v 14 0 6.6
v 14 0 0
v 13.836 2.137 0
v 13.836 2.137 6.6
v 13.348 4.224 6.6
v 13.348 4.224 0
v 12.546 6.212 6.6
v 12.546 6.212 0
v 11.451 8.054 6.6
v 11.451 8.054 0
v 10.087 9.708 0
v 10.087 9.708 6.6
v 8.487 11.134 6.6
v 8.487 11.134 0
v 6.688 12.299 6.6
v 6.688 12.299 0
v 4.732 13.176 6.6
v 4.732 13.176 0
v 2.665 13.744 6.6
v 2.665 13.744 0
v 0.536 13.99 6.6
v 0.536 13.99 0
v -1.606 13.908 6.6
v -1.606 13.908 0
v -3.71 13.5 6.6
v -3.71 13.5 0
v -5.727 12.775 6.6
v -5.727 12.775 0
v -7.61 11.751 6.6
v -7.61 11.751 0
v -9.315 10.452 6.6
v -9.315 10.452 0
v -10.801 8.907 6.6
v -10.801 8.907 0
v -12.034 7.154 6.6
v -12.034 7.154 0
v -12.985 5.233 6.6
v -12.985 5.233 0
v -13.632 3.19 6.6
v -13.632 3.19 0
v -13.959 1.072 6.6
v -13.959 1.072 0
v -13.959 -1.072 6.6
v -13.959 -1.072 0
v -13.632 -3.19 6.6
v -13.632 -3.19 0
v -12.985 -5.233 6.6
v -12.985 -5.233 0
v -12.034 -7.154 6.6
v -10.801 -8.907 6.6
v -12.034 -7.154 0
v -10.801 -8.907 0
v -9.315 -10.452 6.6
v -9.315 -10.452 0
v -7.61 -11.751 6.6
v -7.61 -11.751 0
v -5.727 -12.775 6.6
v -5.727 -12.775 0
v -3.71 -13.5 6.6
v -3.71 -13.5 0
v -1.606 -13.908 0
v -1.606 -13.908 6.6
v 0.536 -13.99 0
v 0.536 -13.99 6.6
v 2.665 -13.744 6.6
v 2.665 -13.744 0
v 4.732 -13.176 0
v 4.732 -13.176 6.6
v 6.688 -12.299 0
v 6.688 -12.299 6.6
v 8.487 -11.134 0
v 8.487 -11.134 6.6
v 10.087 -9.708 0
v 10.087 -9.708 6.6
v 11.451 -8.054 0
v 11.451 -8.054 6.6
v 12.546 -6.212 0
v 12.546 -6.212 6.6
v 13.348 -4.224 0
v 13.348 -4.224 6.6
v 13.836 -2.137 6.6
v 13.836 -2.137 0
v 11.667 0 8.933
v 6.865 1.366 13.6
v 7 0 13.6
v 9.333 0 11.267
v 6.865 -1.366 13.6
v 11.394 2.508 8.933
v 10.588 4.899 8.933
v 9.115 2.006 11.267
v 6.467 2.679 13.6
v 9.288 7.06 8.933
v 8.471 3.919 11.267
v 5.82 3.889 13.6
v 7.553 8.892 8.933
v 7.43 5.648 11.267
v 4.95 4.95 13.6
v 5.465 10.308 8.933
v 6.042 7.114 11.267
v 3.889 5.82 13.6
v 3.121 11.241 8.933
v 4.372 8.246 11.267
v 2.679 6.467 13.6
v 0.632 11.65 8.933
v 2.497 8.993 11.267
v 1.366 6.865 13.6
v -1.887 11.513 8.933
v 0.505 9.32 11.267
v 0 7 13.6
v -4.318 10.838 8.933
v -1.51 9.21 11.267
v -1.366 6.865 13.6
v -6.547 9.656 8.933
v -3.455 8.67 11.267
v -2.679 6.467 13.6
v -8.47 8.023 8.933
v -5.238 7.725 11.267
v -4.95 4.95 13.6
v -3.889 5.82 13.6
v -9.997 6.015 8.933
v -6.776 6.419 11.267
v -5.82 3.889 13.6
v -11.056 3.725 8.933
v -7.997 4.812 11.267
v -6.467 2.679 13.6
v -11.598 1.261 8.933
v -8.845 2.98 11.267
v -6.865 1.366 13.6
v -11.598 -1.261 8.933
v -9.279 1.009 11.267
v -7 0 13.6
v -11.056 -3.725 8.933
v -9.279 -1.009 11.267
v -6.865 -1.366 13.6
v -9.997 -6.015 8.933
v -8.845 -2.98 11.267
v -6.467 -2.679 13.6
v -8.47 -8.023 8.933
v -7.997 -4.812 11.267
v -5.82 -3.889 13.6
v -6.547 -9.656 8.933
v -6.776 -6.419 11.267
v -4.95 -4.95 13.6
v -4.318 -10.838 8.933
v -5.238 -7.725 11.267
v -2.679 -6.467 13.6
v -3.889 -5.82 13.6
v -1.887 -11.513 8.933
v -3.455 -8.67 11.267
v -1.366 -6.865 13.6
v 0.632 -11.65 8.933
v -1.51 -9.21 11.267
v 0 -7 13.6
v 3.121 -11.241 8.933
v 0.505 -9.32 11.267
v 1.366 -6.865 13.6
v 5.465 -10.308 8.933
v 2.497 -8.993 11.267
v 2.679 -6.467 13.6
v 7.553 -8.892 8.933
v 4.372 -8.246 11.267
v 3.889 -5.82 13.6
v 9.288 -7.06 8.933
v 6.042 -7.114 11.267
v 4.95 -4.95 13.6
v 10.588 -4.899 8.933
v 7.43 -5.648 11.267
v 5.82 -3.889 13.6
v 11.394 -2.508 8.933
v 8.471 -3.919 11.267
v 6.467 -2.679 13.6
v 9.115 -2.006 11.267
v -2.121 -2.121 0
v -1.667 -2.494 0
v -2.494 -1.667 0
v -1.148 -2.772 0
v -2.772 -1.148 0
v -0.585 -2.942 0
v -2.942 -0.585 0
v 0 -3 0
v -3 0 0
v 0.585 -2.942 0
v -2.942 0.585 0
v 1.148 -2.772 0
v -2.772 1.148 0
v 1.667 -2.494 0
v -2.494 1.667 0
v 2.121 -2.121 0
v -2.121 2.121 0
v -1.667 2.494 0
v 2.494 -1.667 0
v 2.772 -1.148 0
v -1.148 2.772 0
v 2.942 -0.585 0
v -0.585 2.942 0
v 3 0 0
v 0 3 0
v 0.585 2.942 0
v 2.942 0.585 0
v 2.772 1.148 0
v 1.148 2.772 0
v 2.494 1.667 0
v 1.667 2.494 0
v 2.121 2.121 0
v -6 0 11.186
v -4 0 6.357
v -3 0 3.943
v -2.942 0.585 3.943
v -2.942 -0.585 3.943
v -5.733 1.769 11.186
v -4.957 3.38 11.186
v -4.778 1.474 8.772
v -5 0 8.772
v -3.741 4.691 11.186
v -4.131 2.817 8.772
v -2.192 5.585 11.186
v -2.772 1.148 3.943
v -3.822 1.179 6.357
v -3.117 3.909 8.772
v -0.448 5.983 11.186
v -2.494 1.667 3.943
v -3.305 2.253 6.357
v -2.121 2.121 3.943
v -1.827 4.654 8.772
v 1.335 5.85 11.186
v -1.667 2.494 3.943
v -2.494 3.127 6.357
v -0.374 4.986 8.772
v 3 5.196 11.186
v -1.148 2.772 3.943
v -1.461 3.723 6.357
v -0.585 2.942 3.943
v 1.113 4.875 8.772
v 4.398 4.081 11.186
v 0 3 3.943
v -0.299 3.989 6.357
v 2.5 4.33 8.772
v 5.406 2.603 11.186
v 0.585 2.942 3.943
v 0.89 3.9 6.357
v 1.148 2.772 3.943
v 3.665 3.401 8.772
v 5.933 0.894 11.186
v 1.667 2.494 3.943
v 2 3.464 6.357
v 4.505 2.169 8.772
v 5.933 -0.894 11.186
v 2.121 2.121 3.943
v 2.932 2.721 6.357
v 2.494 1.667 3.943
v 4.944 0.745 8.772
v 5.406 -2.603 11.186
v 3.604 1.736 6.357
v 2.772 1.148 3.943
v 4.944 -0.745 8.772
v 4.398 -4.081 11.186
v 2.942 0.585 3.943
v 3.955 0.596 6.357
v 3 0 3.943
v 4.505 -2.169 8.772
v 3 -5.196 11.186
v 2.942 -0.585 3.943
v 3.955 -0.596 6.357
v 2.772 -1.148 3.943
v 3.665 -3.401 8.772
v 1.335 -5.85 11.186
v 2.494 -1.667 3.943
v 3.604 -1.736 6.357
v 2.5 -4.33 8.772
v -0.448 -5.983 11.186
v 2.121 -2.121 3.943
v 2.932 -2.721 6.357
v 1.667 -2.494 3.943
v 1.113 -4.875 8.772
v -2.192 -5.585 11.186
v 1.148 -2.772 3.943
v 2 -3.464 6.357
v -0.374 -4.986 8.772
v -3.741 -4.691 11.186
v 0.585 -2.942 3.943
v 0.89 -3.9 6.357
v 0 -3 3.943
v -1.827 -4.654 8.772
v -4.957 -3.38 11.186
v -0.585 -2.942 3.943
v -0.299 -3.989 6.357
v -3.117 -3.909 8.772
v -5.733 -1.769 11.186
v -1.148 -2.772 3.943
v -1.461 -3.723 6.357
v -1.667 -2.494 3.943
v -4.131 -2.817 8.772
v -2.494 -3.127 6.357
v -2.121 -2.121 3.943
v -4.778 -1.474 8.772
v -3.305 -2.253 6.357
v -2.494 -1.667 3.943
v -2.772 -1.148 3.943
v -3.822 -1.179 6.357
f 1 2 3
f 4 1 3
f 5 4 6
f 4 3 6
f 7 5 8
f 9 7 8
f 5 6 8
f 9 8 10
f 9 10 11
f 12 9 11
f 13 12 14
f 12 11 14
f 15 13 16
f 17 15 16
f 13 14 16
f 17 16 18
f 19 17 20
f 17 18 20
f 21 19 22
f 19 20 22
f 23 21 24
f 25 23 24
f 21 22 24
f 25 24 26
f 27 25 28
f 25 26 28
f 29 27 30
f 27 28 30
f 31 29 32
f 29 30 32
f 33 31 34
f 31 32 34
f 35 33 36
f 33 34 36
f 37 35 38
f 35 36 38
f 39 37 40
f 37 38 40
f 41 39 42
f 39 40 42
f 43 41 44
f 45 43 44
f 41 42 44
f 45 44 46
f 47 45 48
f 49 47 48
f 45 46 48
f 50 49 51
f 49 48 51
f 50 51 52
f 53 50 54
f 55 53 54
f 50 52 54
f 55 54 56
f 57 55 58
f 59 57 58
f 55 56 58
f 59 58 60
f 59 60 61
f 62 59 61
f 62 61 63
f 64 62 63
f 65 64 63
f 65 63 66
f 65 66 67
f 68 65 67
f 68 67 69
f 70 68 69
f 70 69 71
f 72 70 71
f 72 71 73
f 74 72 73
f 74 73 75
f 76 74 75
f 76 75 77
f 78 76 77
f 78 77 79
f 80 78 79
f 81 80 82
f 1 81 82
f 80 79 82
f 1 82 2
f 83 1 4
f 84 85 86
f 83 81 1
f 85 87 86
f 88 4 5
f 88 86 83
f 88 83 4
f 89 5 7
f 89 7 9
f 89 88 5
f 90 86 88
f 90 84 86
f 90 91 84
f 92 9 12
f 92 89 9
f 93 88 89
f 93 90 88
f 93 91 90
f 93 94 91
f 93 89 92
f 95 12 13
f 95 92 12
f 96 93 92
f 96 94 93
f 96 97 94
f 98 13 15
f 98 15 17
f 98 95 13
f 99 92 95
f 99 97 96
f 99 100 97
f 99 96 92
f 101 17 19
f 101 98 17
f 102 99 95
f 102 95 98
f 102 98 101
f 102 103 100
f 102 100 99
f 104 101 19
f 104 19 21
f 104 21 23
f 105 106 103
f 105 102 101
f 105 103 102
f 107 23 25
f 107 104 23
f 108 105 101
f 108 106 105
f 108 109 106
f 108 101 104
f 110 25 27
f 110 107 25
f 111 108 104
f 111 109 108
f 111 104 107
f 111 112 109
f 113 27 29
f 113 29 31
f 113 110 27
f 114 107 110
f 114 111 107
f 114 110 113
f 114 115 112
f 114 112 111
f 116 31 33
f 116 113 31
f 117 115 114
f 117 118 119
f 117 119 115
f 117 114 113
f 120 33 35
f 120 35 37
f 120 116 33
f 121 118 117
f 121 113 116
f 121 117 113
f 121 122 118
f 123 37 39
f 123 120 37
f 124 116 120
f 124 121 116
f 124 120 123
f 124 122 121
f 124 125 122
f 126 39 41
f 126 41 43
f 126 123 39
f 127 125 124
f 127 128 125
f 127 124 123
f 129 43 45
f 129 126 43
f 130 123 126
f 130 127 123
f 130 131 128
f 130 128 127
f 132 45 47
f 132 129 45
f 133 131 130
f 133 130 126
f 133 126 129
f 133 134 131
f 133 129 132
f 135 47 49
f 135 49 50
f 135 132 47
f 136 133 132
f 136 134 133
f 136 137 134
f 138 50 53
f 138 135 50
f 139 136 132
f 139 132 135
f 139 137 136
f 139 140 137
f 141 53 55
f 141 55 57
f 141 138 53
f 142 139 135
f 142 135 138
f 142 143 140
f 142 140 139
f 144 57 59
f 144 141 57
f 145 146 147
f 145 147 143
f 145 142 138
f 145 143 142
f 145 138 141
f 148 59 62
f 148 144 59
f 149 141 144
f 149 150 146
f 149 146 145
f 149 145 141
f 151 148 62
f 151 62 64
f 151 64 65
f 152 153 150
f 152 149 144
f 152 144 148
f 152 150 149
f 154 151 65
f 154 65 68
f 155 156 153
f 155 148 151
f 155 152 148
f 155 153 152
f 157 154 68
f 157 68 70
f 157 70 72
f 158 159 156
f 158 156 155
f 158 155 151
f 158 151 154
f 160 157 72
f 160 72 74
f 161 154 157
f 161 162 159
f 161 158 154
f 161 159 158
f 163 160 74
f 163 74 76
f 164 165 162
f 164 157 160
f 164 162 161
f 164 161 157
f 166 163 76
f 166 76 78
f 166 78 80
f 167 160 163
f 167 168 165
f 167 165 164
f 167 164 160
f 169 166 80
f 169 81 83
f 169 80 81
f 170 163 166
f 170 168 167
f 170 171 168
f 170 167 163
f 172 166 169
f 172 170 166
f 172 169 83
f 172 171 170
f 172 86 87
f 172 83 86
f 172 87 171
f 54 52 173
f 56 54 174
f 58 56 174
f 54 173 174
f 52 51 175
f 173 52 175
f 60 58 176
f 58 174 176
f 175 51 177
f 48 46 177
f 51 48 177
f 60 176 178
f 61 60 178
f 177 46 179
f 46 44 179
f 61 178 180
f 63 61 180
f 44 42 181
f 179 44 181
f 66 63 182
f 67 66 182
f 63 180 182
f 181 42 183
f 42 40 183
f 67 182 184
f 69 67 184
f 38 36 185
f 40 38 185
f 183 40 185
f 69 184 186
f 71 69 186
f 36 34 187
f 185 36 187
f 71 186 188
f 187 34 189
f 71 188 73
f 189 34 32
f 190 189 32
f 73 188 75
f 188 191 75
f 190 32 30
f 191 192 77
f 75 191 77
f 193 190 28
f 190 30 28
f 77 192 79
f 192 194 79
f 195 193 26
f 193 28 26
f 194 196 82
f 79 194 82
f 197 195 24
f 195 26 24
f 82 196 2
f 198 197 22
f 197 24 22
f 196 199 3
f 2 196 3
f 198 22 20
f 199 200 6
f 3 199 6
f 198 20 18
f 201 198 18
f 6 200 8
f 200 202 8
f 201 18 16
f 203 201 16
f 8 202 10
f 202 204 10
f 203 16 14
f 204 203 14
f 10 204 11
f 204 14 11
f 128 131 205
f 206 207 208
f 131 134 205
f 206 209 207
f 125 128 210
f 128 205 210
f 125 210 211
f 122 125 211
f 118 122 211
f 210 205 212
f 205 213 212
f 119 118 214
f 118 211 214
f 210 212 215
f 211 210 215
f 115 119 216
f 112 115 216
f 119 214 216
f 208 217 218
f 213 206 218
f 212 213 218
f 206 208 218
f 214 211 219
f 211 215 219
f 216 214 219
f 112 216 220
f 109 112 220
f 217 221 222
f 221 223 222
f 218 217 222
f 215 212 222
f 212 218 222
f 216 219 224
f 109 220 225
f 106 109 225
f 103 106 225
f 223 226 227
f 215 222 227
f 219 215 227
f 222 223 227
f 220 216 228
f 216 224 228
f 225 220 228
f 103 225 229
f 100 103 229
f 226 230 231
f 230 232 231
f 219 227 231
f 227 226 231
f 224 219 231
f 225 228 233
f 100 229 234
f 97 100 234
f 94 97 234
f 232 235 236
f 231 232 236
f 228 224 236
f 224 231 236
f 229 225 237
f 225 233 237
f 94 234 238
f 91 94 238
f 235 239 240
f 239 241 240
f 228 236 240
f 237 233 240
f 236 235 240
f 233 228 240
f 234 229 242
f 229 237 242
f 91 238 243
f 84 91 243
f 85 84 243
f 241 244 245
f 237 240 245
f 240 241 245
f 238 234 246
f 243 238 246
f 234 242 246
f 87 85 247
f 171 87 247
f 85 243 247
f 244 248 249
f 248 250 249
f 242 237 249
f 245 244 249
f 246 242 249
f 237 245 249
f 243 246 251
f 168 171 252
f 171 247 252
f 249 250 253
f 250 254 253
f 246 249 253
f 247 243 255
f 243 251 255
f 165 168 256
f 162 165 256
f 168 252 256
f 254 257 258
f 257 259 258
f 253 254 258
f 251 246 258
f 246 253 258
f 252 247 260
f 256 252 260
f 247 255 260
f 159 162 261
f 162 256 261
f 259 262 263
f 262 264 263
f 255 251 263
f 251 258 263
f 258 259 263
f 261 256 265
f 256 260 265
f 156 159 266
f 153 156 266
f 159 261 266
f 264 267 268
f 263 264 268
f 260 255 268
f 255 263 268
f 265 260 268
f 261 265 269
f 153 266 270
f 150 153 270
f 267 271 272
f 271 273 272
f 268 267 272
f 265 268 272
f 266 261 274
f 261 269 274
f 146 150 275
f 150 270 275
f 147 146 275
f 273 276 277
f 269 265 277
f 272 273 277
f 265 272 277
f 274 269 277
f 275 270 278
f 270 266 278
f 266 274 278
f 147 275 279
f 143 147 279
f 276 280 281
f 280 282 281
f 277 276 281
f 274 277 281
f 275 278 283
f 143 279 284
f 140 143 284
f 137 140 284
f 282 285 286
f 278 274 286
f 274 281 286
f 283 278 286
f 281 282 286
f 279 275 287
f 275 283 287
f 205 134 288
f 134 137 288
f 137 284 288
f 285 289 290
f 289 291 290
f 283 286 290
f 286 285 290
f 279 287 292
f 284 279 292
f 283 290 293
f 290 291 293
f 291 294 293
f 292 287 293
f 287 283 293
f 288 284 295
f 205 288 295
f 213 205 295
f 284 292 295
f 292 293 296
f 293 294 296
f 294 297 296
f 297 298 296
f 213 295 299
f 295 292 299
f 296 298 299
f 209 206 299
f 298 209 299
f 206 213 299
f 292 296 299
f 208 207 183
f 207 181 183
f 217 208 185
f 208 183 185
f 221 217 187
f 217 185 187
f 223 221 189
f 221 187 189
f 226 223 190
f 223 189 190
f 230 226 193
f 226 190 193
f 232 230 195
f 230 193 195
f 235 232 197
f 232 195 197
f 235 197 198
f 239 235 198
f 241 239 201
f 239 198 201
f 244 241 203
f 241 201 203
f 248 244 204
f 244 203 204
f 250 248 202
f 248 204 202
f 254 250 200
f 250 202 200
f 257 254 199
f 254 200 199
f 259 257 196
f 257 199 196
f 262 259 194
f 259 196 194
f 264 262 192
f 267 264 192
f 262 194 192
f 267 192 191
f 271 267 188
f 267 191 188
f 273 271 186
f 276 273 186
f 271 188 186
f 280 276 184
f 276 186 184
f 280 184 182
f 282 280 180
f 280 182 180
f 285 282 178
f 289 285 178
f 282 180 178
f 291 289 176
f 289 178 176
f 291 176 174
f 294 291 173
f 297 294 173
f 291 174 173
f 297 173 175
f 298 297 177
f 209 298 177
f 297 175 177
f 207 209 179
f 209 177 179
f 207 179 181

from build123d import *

# Parameters (mm, degrees)
F0_R           = 14
F1_DEPTH       = 14.6
F3_SIZE        = 8
F4_D           = 6
F4_START       = 1
F4_CSINK_D     = 14
F4_CSINK_ANGLE = 45


with BuildPart() as f1:
    # F0 (on Top) → F1 (new body)
    with BuildSketch(Plane.XY):
        Circle(F0_R)
    extrude(amount=F1_DEPTH)

    # F3
    f3_edges = [f1.edges().sort_by_distance(p)[0] for p in [
        (-14, 0, 14.6),
    ]]
    chamfer(f3_edges, length=F3_SIZE)

    # F4 (through all)
    # its depths count from where the whole tool has entered the part; down to there all is cleared
    with Locations(Plane.XY.offset(14.6).offset(-F4_START)):
        with Locations((0, 0)):
            CounterSinkHole(F4_D / 2, F4_CSINK_D / 2, counter_sink_angle=F4_CSINK_ANGLE)


solid = f1.part
